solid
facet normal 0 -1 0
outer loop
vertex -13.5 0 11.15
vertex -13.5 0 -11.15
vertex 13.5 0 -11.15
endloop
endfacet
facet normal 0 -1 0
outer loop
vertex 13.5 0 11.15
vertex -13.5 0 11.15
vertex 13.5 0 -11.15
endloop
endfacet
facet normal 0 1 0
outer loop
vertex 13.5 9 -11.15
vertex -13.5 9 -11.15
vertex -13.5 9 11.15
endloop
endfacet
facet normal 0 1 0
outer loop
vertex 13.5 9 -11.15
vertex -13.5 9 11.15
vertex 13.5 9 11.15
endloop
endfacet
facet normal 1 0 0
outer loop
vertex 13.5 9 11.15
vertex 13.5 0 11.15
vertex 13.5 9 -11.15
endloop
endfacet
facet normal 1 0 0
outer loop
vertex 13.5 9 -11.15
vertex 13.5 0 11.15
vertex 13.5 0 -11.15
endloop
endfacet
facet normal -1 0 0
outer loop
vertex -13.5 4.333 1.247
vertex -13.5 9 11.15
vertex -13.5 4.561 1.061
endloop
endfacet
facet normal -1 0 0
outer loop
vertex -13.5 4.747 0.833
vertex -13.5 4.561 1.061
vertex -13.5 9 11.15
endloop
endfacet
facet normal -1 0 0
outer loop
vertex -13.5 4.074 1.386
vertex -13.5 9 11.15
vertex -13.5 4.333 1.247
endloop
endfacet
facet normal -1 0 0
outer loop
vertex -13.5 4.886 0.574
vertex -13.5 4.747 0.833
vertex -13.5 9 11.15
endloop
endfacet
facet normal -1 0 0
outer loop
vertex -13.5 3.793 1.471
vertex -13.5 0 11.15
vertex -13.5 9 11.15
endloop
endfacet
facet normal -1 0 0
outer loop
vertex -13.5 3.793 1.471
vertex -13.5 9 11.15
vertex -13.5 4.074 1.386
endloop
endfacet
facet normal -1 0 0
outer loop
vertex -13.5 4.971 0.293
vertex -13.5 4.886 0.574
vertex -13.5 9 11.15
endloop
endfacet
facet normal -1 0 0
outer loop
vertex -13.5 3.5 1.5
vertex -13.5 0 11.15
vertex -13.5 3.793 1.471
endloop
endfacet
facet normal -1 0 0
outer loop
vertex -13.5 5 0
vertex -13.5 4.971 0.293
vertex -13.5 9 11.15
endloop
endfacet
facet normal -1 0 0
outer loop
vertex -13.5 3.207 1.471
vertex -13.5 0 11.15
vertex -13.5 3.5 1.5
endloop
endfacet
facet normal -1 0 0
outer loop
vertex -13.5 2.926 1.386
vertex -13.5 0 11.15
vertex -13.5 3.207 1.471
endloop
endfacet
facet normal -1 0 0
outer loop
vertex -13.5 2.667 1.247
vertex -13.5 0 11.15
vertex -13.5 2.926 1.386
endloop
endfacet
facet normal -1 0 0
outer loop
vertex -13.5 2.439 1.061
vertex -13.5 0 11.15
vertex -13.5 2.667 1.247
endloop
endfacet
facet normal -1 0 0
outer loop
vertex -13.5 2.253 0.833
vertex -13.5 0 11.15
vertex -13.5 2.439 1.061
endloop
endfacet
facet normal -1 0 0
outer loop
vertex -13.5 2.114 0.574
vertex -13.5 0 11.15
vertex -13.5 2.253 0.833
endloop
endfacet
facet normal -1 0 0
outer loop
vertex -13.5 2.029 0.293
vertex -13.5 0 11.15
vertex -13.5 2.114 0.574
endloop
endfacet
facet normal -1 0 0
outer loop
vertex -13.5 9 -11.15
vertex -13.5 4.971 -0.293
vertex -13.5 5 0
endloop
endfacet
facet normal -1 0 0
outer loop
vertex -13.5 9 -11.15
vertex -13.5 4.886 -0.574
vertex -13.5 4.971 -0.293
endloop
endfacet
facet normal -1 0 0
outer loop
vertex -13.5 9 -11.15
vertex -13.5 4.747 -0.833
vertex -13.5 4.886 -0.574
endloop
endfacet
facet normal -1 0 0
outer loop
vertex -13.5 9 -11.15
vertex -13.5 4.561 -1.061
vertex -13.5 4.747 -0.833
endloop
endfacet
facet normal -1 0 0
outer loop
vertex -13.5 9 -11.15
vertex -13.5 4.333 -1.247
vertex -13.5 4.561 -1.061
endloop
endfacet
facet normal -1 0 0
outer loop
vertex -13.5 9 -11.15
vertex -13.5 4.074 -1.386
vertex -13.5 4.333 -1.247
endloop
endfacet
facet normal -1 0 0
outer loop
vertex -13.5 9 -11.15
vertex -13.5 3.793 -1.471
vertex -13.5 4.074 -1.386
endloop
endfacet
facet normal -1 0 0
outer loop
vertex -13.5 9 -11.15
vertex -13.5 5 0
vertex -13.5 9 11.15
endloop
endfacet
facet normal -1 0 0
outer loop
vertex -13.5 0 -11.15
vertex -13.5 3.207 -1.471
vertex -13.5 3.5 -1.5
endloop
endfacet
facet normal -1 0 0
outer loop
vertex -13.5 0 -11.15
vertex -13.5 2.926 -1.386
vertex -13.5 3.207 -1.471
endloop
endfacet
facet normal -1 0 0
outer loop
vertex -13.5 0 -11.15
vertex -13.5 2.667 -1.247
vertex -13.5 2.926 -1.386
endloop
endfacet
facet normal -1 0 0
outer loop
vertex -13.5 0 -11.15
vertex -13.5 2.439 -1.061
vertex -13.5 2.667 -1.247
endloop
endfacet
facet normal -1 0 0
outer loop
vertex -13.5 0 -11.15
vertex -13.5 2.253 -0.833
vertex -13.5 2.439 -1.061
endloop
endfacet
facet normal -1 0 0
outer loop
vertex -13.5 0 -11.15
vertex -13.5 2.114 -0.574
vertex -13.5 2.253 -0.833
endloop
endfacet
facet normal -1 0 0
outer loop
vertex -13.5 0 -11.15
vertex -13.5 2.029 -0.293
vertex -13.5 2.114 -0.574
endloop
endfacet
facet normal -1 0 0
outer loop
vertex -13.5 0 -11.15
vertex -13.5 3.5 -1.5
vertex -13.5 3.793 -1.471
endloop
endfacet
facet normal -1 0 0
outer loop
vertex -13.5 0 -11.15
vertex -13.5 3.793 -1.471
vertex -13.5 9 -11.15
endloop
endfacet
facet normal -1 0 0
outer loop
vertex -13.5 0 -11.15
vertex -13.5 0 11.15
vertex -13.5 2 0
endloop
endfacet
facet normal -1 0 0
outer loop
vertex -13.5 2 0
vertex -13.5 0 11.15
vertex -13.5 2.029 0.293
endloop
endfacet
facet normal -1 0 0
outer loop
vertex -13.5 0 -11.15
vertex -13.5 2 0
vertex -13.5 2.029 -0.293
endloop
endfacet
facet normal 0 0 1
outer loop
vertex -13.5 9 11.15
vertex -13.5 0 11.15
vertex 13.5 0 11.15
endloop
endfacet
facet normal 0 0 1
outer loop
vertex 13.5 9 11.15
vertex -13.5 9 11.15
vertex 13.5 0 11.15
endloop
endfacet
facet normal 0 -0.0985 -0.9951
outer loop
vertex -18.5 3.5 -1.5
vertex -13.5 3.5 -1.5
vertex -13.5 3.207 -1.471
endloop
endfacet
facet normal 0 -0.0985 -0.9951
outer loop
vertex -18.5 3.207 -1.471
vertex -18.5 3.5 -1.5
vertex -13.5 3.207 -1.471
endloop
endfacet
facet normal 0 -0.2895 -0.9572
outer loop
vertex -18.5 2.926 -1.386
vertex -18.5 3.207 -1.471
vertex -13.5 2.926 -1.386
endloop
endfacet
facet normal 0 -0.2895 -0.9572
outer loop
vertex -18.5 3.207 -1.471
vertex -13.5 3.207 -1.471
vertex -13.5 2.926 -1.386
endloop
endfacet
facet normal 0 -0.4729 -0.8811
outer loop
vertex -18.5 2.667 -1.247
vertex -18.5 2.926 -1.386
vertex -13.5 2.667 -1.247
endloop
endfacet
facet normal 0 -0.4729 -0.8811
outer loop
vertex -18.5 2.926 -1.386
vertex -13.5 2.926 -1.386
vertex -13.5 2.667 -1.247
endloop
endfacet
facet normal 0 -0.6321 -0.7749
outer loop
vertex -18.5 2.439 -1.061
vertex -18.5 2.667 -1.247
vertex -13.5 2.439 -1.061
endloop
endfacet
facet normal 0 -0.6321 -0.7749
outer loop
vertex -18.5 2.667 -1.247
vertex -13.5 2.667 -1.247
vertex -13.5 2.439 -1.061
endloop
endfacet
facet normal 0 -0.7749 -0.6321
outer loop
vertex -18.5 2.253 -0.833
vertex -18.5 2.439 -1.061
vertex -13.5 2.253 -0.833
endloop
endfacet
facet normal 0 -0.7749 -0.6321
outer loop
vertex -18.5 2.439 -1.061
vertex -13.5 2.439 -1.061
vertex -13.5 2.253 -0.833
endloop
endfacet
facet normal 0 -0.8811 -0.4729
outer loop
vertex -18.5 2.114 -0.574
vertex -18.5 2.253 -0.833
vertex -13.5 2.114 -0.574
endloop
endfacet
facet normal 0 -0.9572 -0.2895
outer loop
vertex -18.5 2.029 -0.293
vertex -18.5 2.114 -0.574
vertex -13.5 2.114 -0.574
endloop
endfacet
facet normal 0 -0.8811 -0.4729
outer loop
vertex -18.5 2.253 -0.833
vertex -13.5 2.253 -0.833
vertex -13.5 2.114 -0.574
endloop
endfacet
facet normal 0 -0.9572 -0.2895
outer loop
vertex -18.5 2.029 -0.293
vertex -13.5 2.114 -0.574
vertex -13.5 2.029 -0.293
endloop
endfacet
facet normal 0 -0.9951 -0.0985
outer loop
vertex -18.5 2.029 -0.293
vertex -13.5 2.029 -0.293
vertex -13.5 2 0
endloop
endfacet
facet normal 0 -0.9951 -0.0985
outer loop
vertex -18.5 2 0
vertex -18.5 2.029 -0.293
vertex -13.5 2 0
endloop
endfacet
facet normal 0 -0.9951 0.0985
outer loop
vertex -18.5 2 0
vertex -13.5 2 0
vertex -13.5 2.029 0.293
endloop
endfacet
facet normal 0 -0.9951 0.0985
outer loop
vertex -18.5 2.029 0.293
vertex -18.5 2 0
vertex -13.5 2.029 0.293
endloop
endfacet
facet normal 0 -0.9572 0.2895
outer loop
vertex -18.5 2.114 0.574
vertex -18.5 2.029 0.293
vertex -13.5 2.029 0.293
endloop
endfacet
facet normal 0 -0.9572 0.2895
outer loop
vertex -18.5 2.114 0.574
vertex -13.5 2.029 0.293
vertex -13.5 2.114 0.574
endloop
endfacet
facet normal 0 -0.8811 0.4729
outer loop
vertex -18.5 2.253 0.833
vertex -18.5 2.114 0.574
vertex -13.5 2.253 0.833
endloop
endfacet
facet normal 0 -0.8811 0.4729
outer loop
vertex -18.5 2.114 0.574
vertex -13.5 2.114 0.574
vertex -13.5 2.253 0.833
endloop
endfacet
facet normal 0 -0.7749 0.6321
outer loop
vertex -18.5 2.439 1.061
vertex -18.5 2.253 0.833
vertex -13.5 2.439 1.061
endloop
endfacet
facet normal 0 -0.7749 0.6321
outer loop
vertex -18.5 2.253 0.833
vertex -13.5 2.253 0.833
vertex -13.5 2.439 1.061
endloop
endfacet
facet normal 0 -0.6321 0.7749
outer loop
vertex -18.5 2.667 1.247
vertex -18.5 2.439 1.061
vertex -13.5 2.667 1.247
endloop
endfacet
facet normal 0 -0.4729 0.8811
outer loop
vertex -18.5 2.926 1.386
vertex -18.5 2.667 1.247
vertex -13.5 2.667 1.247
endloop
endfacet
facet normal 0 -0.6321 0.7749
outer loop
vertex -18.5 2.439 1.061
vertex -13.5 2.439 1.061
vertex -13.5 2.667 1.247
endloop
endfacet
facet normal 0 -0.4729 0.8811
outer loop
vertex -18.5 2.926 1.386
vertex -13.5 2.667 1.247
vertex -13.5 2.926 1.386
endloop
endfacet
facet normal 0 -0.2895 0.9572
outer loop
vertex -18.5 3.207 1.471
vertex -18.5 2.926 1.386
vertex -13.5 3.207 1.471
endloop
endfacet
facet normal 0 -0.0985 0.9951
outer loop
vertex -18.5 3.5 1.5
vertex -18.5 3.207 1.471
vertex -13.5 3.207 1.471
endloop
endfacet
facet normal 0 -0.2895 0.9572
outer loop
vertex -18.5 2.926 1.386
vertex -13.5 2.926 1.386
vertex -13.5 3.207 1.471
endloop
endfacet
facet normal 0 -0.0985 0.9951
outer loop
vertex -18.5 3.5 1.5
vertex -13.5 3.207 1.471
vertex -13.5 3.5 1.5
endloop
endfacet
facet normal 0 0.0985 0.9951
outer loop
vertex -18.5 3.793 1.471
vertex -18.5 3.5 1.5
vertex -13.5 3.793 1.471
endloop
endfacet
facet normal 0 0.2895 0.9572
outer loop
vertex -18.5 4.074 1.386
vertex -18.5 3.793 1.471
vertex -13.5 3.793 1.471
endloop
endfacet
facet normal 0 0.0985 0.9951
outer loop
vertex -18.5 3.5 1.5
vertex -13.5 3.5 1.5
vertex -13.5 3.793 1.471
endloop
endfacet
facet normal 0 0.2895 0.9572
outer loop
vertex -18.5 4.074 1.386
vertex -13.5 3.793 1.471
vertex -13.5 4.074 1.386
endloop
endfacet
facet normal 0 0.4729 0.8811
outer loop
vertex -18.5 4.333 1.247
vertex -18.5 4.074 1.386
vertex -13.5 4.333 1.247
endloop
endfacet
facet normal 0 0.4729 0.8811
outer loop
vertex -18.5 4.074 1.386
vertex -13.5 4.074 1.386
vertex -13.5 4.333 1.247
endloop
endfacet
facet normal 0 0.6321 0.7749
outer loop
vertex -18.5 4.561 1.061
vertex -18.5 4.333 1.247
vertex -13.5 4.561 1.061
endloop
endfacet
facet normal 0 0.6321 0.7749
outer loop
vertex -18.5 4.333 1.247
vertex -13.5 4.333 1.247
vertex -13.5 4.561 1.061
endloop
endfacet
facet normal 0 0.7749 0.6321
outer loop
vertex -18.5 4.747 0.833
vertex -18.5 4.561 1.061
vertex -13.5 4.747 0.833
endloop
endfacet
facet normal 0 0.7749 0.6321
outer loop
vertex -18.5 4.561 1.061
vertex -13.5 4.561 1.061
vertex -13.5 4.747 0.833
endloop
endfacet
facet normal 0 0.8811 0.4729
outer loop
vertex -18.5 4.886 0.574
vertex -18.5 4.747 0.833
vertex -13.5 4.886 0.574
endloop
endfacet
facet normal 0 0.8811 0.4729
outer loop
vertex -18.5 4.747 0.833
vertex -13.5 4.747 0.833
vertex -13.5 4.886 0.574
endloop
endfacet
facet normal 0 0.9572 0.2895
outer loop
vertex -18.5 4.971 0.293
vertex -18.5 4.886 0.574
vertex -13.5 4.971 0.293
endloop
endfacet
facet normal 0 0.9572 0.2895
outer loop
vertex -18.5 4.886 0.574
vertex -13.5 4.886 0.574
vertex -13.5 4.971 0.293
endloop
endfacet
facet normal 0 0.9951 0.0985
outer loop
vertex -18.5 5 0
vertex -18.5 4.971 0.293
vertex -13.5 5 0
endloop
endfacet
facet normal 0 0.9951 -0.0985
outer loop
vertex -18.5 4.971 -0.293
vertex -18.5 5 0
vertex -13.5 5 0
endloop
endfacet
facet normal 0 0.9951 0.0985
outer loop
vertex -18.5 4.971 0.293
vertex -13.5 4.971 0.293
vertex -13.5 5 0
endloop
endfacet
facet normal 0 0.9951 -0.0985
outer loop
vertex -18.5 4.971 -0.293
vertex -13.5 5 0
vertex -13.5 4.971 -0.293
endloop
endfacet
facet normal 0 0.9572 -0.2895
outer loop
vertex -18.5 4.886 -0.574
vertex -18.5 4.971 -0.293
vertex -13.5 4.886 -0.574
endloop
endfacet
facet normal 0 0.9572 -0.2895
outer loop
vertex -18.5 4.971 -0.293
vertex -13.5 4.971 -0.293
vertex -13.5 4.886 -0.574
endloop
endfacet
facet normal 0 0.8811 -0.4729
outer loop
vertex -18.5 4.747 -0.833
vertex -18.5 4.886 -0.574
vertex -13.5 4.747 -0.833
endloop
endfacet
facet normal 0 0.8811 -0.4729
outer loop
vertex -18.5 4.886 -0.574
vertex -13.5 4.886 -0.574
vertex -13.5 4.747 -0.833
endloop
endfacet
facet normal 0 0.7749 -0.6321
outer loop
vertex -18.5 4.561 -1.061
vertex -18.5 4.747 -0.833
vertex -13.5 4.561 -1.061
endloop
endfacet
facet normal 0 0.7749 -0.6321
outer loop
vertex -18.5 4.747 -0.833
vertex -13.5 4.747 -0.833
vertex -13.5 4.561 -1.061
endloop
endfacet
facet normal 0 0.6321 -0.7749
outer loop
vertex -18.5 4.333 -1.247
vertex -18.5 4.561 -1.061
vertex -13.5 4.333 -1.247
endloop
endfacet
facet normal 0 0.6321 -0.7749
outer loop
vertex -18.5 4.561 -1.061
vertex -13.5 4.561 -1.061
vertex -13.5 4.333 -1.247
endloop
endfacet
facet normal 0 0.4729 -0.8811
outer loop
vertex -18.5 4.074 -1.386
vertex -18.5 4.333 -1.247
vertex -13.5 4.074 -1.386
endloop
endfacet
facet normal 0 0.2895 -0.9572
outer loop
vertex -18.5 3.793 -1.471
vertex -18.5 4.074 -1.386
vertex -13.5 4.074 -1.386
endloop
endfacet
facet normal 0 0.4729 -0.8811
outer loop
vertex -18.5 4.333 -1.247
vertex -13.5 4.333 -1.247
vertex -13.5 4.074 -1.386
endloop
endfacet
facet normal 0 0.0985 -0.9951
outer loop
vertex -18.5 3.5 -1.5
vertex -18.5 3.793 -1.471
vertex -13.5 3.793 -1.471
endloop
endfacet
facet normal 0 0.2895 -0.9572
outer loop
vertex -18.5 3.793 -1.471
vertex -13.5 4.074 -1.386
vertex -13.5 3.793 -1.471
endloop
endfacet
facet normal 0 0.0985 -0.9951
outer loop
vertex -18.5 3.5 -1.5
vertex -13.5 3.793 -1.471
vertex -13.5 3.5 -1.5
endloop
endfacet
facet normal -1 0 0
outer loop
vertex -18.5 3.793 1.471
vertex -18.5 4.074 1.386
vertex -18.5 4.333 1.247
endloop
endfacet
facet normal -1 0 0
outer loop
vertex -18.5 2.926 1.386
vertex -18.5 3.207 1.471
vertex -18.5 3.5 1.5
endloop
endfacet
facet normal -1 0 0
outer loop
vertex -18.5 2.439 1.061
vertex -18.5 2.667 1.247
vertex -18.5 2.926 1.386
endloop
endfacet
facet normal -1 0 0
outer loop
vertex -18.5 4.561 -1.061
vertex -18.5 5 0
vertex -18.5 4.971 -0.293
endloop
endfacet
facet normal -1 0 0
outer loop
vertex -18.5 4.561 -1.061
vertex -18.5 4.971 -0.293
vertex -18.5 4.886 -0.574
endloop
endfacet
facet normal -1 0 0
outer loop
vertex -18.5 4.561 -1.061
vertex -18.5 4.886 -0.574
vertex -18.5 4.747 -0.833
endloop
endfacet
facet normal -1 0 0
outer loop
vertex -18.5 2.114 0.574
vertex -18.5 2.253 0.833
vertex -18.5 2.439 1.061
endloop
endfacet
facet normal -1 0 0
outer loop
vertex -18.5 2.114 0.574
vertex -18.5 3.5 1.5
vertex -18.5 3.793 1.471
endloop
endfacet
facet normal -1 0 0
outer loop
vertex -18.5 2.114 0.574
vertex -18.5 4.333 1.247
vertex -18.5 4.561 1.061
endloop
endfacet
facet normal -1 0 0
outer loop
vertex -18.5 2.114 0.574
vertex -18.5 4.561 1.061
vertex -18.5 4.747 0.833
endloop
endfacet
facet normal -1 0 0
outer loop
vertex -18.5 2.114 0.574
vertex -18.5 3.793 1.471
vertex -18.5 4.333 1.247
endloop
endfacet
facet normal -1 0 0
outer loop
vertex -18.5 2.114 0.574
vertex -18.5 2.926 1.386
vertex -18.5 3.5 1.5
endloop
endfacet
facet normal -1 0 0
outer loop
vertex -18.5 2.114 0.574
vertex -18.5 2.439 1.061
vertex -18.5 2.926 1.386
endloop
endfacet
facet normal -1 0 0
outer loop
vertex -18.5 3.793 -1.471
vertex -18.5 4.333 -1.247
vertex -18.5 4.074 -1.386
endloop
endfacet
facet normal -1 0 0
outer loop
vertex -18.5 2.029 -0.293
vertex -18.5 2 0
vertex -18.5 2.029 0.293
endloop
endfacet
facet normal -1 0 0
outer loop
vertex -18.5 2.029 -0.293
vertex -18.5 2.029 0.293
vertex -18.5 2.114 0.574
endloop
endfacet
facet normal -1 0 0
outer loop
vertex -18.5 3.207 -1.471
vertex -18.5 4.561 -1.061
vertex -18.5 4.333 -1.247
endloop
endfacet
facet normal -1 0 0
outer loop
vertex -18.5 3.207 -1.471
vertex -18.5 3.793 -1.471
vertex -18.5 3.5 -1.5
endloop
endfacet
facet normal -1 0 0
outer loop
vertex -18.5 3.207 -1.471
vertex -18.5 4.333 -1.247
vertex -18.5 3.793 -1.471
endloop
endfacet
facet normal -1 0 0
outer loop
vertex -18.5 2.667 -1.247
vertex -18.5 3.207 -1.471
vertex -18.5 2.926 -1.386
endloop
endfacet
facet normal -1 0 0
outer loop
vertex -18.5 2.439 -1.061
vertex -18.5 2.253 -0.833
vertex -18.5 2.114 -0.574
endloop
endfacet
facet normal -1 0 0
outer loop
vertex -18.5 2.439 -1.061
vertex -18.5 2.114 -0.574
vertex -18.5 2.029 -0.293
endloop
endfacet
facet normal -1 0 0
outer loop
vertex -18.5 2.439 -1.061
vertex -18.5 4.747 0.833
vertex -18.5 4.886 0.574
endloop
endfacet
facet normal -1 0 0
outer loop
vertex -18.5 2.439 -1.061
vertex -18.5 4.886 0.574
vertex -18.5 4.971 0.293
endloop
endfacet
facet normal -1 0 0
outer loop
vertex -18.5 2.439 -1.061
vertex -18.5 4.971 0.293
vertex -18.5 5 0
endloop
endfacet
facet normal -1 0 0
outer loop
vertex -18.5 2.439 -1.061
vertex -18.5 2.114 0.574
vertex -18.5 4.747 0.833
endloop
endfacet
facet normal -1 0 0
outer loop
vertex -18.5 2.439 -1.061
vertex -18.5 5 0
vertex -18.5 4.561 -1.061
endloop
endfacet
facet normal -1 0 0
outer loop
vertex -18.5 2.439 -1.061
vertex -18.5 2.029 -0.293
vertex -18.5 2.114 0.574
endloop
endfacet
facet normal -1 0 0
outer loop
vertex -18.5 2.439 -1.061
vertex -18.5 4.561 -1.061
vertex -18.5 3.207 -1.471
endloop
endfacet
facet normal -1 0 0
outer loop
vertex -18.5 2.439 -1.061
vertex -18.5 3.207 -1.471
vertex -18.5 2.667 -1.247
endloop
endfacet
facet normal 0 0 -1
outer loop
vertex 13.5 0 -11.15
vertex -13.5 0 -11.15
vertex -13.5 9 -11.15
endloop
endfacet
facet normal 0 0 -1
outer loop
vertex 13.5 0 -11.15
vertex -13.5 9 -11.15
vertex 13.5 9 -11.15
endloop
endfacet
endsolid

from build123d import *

# Parameters (mm, degrees)
SKETCH1_W           = 27
SKETCH1_H           = 22.3
BOSS_EXTRUDE1_DEPTH = 9
SKETCH2_R           = 1.5
BOSS_EXTRUDE3_DEPTH = 5


with BuildPart() as part:
    # Sketch1 → Boss-Extrude1 (new body)
    with BuildSketch(Plane(origin=(0, 0, 0), x_dir=(1, 0, 0), z_dir=(0, 1, 0))):
        Rectangle(SKETCH1_W, SKETCH1_H)
    extrude(amount=BOSS_EXTRUDE1_DEPTH)

    # Sketch2 → Boss-Extrude3 (add)
    with BuildSketch(Plane.ZY.offset(13.5)):
        with Locations(Location((0, 3.5, 0), (0, 0, 180))):
            Circle(SKETCH2_R)
    extrude(amount=BOSS_EXTRUDE3_DEPTH)


solid = part.part
